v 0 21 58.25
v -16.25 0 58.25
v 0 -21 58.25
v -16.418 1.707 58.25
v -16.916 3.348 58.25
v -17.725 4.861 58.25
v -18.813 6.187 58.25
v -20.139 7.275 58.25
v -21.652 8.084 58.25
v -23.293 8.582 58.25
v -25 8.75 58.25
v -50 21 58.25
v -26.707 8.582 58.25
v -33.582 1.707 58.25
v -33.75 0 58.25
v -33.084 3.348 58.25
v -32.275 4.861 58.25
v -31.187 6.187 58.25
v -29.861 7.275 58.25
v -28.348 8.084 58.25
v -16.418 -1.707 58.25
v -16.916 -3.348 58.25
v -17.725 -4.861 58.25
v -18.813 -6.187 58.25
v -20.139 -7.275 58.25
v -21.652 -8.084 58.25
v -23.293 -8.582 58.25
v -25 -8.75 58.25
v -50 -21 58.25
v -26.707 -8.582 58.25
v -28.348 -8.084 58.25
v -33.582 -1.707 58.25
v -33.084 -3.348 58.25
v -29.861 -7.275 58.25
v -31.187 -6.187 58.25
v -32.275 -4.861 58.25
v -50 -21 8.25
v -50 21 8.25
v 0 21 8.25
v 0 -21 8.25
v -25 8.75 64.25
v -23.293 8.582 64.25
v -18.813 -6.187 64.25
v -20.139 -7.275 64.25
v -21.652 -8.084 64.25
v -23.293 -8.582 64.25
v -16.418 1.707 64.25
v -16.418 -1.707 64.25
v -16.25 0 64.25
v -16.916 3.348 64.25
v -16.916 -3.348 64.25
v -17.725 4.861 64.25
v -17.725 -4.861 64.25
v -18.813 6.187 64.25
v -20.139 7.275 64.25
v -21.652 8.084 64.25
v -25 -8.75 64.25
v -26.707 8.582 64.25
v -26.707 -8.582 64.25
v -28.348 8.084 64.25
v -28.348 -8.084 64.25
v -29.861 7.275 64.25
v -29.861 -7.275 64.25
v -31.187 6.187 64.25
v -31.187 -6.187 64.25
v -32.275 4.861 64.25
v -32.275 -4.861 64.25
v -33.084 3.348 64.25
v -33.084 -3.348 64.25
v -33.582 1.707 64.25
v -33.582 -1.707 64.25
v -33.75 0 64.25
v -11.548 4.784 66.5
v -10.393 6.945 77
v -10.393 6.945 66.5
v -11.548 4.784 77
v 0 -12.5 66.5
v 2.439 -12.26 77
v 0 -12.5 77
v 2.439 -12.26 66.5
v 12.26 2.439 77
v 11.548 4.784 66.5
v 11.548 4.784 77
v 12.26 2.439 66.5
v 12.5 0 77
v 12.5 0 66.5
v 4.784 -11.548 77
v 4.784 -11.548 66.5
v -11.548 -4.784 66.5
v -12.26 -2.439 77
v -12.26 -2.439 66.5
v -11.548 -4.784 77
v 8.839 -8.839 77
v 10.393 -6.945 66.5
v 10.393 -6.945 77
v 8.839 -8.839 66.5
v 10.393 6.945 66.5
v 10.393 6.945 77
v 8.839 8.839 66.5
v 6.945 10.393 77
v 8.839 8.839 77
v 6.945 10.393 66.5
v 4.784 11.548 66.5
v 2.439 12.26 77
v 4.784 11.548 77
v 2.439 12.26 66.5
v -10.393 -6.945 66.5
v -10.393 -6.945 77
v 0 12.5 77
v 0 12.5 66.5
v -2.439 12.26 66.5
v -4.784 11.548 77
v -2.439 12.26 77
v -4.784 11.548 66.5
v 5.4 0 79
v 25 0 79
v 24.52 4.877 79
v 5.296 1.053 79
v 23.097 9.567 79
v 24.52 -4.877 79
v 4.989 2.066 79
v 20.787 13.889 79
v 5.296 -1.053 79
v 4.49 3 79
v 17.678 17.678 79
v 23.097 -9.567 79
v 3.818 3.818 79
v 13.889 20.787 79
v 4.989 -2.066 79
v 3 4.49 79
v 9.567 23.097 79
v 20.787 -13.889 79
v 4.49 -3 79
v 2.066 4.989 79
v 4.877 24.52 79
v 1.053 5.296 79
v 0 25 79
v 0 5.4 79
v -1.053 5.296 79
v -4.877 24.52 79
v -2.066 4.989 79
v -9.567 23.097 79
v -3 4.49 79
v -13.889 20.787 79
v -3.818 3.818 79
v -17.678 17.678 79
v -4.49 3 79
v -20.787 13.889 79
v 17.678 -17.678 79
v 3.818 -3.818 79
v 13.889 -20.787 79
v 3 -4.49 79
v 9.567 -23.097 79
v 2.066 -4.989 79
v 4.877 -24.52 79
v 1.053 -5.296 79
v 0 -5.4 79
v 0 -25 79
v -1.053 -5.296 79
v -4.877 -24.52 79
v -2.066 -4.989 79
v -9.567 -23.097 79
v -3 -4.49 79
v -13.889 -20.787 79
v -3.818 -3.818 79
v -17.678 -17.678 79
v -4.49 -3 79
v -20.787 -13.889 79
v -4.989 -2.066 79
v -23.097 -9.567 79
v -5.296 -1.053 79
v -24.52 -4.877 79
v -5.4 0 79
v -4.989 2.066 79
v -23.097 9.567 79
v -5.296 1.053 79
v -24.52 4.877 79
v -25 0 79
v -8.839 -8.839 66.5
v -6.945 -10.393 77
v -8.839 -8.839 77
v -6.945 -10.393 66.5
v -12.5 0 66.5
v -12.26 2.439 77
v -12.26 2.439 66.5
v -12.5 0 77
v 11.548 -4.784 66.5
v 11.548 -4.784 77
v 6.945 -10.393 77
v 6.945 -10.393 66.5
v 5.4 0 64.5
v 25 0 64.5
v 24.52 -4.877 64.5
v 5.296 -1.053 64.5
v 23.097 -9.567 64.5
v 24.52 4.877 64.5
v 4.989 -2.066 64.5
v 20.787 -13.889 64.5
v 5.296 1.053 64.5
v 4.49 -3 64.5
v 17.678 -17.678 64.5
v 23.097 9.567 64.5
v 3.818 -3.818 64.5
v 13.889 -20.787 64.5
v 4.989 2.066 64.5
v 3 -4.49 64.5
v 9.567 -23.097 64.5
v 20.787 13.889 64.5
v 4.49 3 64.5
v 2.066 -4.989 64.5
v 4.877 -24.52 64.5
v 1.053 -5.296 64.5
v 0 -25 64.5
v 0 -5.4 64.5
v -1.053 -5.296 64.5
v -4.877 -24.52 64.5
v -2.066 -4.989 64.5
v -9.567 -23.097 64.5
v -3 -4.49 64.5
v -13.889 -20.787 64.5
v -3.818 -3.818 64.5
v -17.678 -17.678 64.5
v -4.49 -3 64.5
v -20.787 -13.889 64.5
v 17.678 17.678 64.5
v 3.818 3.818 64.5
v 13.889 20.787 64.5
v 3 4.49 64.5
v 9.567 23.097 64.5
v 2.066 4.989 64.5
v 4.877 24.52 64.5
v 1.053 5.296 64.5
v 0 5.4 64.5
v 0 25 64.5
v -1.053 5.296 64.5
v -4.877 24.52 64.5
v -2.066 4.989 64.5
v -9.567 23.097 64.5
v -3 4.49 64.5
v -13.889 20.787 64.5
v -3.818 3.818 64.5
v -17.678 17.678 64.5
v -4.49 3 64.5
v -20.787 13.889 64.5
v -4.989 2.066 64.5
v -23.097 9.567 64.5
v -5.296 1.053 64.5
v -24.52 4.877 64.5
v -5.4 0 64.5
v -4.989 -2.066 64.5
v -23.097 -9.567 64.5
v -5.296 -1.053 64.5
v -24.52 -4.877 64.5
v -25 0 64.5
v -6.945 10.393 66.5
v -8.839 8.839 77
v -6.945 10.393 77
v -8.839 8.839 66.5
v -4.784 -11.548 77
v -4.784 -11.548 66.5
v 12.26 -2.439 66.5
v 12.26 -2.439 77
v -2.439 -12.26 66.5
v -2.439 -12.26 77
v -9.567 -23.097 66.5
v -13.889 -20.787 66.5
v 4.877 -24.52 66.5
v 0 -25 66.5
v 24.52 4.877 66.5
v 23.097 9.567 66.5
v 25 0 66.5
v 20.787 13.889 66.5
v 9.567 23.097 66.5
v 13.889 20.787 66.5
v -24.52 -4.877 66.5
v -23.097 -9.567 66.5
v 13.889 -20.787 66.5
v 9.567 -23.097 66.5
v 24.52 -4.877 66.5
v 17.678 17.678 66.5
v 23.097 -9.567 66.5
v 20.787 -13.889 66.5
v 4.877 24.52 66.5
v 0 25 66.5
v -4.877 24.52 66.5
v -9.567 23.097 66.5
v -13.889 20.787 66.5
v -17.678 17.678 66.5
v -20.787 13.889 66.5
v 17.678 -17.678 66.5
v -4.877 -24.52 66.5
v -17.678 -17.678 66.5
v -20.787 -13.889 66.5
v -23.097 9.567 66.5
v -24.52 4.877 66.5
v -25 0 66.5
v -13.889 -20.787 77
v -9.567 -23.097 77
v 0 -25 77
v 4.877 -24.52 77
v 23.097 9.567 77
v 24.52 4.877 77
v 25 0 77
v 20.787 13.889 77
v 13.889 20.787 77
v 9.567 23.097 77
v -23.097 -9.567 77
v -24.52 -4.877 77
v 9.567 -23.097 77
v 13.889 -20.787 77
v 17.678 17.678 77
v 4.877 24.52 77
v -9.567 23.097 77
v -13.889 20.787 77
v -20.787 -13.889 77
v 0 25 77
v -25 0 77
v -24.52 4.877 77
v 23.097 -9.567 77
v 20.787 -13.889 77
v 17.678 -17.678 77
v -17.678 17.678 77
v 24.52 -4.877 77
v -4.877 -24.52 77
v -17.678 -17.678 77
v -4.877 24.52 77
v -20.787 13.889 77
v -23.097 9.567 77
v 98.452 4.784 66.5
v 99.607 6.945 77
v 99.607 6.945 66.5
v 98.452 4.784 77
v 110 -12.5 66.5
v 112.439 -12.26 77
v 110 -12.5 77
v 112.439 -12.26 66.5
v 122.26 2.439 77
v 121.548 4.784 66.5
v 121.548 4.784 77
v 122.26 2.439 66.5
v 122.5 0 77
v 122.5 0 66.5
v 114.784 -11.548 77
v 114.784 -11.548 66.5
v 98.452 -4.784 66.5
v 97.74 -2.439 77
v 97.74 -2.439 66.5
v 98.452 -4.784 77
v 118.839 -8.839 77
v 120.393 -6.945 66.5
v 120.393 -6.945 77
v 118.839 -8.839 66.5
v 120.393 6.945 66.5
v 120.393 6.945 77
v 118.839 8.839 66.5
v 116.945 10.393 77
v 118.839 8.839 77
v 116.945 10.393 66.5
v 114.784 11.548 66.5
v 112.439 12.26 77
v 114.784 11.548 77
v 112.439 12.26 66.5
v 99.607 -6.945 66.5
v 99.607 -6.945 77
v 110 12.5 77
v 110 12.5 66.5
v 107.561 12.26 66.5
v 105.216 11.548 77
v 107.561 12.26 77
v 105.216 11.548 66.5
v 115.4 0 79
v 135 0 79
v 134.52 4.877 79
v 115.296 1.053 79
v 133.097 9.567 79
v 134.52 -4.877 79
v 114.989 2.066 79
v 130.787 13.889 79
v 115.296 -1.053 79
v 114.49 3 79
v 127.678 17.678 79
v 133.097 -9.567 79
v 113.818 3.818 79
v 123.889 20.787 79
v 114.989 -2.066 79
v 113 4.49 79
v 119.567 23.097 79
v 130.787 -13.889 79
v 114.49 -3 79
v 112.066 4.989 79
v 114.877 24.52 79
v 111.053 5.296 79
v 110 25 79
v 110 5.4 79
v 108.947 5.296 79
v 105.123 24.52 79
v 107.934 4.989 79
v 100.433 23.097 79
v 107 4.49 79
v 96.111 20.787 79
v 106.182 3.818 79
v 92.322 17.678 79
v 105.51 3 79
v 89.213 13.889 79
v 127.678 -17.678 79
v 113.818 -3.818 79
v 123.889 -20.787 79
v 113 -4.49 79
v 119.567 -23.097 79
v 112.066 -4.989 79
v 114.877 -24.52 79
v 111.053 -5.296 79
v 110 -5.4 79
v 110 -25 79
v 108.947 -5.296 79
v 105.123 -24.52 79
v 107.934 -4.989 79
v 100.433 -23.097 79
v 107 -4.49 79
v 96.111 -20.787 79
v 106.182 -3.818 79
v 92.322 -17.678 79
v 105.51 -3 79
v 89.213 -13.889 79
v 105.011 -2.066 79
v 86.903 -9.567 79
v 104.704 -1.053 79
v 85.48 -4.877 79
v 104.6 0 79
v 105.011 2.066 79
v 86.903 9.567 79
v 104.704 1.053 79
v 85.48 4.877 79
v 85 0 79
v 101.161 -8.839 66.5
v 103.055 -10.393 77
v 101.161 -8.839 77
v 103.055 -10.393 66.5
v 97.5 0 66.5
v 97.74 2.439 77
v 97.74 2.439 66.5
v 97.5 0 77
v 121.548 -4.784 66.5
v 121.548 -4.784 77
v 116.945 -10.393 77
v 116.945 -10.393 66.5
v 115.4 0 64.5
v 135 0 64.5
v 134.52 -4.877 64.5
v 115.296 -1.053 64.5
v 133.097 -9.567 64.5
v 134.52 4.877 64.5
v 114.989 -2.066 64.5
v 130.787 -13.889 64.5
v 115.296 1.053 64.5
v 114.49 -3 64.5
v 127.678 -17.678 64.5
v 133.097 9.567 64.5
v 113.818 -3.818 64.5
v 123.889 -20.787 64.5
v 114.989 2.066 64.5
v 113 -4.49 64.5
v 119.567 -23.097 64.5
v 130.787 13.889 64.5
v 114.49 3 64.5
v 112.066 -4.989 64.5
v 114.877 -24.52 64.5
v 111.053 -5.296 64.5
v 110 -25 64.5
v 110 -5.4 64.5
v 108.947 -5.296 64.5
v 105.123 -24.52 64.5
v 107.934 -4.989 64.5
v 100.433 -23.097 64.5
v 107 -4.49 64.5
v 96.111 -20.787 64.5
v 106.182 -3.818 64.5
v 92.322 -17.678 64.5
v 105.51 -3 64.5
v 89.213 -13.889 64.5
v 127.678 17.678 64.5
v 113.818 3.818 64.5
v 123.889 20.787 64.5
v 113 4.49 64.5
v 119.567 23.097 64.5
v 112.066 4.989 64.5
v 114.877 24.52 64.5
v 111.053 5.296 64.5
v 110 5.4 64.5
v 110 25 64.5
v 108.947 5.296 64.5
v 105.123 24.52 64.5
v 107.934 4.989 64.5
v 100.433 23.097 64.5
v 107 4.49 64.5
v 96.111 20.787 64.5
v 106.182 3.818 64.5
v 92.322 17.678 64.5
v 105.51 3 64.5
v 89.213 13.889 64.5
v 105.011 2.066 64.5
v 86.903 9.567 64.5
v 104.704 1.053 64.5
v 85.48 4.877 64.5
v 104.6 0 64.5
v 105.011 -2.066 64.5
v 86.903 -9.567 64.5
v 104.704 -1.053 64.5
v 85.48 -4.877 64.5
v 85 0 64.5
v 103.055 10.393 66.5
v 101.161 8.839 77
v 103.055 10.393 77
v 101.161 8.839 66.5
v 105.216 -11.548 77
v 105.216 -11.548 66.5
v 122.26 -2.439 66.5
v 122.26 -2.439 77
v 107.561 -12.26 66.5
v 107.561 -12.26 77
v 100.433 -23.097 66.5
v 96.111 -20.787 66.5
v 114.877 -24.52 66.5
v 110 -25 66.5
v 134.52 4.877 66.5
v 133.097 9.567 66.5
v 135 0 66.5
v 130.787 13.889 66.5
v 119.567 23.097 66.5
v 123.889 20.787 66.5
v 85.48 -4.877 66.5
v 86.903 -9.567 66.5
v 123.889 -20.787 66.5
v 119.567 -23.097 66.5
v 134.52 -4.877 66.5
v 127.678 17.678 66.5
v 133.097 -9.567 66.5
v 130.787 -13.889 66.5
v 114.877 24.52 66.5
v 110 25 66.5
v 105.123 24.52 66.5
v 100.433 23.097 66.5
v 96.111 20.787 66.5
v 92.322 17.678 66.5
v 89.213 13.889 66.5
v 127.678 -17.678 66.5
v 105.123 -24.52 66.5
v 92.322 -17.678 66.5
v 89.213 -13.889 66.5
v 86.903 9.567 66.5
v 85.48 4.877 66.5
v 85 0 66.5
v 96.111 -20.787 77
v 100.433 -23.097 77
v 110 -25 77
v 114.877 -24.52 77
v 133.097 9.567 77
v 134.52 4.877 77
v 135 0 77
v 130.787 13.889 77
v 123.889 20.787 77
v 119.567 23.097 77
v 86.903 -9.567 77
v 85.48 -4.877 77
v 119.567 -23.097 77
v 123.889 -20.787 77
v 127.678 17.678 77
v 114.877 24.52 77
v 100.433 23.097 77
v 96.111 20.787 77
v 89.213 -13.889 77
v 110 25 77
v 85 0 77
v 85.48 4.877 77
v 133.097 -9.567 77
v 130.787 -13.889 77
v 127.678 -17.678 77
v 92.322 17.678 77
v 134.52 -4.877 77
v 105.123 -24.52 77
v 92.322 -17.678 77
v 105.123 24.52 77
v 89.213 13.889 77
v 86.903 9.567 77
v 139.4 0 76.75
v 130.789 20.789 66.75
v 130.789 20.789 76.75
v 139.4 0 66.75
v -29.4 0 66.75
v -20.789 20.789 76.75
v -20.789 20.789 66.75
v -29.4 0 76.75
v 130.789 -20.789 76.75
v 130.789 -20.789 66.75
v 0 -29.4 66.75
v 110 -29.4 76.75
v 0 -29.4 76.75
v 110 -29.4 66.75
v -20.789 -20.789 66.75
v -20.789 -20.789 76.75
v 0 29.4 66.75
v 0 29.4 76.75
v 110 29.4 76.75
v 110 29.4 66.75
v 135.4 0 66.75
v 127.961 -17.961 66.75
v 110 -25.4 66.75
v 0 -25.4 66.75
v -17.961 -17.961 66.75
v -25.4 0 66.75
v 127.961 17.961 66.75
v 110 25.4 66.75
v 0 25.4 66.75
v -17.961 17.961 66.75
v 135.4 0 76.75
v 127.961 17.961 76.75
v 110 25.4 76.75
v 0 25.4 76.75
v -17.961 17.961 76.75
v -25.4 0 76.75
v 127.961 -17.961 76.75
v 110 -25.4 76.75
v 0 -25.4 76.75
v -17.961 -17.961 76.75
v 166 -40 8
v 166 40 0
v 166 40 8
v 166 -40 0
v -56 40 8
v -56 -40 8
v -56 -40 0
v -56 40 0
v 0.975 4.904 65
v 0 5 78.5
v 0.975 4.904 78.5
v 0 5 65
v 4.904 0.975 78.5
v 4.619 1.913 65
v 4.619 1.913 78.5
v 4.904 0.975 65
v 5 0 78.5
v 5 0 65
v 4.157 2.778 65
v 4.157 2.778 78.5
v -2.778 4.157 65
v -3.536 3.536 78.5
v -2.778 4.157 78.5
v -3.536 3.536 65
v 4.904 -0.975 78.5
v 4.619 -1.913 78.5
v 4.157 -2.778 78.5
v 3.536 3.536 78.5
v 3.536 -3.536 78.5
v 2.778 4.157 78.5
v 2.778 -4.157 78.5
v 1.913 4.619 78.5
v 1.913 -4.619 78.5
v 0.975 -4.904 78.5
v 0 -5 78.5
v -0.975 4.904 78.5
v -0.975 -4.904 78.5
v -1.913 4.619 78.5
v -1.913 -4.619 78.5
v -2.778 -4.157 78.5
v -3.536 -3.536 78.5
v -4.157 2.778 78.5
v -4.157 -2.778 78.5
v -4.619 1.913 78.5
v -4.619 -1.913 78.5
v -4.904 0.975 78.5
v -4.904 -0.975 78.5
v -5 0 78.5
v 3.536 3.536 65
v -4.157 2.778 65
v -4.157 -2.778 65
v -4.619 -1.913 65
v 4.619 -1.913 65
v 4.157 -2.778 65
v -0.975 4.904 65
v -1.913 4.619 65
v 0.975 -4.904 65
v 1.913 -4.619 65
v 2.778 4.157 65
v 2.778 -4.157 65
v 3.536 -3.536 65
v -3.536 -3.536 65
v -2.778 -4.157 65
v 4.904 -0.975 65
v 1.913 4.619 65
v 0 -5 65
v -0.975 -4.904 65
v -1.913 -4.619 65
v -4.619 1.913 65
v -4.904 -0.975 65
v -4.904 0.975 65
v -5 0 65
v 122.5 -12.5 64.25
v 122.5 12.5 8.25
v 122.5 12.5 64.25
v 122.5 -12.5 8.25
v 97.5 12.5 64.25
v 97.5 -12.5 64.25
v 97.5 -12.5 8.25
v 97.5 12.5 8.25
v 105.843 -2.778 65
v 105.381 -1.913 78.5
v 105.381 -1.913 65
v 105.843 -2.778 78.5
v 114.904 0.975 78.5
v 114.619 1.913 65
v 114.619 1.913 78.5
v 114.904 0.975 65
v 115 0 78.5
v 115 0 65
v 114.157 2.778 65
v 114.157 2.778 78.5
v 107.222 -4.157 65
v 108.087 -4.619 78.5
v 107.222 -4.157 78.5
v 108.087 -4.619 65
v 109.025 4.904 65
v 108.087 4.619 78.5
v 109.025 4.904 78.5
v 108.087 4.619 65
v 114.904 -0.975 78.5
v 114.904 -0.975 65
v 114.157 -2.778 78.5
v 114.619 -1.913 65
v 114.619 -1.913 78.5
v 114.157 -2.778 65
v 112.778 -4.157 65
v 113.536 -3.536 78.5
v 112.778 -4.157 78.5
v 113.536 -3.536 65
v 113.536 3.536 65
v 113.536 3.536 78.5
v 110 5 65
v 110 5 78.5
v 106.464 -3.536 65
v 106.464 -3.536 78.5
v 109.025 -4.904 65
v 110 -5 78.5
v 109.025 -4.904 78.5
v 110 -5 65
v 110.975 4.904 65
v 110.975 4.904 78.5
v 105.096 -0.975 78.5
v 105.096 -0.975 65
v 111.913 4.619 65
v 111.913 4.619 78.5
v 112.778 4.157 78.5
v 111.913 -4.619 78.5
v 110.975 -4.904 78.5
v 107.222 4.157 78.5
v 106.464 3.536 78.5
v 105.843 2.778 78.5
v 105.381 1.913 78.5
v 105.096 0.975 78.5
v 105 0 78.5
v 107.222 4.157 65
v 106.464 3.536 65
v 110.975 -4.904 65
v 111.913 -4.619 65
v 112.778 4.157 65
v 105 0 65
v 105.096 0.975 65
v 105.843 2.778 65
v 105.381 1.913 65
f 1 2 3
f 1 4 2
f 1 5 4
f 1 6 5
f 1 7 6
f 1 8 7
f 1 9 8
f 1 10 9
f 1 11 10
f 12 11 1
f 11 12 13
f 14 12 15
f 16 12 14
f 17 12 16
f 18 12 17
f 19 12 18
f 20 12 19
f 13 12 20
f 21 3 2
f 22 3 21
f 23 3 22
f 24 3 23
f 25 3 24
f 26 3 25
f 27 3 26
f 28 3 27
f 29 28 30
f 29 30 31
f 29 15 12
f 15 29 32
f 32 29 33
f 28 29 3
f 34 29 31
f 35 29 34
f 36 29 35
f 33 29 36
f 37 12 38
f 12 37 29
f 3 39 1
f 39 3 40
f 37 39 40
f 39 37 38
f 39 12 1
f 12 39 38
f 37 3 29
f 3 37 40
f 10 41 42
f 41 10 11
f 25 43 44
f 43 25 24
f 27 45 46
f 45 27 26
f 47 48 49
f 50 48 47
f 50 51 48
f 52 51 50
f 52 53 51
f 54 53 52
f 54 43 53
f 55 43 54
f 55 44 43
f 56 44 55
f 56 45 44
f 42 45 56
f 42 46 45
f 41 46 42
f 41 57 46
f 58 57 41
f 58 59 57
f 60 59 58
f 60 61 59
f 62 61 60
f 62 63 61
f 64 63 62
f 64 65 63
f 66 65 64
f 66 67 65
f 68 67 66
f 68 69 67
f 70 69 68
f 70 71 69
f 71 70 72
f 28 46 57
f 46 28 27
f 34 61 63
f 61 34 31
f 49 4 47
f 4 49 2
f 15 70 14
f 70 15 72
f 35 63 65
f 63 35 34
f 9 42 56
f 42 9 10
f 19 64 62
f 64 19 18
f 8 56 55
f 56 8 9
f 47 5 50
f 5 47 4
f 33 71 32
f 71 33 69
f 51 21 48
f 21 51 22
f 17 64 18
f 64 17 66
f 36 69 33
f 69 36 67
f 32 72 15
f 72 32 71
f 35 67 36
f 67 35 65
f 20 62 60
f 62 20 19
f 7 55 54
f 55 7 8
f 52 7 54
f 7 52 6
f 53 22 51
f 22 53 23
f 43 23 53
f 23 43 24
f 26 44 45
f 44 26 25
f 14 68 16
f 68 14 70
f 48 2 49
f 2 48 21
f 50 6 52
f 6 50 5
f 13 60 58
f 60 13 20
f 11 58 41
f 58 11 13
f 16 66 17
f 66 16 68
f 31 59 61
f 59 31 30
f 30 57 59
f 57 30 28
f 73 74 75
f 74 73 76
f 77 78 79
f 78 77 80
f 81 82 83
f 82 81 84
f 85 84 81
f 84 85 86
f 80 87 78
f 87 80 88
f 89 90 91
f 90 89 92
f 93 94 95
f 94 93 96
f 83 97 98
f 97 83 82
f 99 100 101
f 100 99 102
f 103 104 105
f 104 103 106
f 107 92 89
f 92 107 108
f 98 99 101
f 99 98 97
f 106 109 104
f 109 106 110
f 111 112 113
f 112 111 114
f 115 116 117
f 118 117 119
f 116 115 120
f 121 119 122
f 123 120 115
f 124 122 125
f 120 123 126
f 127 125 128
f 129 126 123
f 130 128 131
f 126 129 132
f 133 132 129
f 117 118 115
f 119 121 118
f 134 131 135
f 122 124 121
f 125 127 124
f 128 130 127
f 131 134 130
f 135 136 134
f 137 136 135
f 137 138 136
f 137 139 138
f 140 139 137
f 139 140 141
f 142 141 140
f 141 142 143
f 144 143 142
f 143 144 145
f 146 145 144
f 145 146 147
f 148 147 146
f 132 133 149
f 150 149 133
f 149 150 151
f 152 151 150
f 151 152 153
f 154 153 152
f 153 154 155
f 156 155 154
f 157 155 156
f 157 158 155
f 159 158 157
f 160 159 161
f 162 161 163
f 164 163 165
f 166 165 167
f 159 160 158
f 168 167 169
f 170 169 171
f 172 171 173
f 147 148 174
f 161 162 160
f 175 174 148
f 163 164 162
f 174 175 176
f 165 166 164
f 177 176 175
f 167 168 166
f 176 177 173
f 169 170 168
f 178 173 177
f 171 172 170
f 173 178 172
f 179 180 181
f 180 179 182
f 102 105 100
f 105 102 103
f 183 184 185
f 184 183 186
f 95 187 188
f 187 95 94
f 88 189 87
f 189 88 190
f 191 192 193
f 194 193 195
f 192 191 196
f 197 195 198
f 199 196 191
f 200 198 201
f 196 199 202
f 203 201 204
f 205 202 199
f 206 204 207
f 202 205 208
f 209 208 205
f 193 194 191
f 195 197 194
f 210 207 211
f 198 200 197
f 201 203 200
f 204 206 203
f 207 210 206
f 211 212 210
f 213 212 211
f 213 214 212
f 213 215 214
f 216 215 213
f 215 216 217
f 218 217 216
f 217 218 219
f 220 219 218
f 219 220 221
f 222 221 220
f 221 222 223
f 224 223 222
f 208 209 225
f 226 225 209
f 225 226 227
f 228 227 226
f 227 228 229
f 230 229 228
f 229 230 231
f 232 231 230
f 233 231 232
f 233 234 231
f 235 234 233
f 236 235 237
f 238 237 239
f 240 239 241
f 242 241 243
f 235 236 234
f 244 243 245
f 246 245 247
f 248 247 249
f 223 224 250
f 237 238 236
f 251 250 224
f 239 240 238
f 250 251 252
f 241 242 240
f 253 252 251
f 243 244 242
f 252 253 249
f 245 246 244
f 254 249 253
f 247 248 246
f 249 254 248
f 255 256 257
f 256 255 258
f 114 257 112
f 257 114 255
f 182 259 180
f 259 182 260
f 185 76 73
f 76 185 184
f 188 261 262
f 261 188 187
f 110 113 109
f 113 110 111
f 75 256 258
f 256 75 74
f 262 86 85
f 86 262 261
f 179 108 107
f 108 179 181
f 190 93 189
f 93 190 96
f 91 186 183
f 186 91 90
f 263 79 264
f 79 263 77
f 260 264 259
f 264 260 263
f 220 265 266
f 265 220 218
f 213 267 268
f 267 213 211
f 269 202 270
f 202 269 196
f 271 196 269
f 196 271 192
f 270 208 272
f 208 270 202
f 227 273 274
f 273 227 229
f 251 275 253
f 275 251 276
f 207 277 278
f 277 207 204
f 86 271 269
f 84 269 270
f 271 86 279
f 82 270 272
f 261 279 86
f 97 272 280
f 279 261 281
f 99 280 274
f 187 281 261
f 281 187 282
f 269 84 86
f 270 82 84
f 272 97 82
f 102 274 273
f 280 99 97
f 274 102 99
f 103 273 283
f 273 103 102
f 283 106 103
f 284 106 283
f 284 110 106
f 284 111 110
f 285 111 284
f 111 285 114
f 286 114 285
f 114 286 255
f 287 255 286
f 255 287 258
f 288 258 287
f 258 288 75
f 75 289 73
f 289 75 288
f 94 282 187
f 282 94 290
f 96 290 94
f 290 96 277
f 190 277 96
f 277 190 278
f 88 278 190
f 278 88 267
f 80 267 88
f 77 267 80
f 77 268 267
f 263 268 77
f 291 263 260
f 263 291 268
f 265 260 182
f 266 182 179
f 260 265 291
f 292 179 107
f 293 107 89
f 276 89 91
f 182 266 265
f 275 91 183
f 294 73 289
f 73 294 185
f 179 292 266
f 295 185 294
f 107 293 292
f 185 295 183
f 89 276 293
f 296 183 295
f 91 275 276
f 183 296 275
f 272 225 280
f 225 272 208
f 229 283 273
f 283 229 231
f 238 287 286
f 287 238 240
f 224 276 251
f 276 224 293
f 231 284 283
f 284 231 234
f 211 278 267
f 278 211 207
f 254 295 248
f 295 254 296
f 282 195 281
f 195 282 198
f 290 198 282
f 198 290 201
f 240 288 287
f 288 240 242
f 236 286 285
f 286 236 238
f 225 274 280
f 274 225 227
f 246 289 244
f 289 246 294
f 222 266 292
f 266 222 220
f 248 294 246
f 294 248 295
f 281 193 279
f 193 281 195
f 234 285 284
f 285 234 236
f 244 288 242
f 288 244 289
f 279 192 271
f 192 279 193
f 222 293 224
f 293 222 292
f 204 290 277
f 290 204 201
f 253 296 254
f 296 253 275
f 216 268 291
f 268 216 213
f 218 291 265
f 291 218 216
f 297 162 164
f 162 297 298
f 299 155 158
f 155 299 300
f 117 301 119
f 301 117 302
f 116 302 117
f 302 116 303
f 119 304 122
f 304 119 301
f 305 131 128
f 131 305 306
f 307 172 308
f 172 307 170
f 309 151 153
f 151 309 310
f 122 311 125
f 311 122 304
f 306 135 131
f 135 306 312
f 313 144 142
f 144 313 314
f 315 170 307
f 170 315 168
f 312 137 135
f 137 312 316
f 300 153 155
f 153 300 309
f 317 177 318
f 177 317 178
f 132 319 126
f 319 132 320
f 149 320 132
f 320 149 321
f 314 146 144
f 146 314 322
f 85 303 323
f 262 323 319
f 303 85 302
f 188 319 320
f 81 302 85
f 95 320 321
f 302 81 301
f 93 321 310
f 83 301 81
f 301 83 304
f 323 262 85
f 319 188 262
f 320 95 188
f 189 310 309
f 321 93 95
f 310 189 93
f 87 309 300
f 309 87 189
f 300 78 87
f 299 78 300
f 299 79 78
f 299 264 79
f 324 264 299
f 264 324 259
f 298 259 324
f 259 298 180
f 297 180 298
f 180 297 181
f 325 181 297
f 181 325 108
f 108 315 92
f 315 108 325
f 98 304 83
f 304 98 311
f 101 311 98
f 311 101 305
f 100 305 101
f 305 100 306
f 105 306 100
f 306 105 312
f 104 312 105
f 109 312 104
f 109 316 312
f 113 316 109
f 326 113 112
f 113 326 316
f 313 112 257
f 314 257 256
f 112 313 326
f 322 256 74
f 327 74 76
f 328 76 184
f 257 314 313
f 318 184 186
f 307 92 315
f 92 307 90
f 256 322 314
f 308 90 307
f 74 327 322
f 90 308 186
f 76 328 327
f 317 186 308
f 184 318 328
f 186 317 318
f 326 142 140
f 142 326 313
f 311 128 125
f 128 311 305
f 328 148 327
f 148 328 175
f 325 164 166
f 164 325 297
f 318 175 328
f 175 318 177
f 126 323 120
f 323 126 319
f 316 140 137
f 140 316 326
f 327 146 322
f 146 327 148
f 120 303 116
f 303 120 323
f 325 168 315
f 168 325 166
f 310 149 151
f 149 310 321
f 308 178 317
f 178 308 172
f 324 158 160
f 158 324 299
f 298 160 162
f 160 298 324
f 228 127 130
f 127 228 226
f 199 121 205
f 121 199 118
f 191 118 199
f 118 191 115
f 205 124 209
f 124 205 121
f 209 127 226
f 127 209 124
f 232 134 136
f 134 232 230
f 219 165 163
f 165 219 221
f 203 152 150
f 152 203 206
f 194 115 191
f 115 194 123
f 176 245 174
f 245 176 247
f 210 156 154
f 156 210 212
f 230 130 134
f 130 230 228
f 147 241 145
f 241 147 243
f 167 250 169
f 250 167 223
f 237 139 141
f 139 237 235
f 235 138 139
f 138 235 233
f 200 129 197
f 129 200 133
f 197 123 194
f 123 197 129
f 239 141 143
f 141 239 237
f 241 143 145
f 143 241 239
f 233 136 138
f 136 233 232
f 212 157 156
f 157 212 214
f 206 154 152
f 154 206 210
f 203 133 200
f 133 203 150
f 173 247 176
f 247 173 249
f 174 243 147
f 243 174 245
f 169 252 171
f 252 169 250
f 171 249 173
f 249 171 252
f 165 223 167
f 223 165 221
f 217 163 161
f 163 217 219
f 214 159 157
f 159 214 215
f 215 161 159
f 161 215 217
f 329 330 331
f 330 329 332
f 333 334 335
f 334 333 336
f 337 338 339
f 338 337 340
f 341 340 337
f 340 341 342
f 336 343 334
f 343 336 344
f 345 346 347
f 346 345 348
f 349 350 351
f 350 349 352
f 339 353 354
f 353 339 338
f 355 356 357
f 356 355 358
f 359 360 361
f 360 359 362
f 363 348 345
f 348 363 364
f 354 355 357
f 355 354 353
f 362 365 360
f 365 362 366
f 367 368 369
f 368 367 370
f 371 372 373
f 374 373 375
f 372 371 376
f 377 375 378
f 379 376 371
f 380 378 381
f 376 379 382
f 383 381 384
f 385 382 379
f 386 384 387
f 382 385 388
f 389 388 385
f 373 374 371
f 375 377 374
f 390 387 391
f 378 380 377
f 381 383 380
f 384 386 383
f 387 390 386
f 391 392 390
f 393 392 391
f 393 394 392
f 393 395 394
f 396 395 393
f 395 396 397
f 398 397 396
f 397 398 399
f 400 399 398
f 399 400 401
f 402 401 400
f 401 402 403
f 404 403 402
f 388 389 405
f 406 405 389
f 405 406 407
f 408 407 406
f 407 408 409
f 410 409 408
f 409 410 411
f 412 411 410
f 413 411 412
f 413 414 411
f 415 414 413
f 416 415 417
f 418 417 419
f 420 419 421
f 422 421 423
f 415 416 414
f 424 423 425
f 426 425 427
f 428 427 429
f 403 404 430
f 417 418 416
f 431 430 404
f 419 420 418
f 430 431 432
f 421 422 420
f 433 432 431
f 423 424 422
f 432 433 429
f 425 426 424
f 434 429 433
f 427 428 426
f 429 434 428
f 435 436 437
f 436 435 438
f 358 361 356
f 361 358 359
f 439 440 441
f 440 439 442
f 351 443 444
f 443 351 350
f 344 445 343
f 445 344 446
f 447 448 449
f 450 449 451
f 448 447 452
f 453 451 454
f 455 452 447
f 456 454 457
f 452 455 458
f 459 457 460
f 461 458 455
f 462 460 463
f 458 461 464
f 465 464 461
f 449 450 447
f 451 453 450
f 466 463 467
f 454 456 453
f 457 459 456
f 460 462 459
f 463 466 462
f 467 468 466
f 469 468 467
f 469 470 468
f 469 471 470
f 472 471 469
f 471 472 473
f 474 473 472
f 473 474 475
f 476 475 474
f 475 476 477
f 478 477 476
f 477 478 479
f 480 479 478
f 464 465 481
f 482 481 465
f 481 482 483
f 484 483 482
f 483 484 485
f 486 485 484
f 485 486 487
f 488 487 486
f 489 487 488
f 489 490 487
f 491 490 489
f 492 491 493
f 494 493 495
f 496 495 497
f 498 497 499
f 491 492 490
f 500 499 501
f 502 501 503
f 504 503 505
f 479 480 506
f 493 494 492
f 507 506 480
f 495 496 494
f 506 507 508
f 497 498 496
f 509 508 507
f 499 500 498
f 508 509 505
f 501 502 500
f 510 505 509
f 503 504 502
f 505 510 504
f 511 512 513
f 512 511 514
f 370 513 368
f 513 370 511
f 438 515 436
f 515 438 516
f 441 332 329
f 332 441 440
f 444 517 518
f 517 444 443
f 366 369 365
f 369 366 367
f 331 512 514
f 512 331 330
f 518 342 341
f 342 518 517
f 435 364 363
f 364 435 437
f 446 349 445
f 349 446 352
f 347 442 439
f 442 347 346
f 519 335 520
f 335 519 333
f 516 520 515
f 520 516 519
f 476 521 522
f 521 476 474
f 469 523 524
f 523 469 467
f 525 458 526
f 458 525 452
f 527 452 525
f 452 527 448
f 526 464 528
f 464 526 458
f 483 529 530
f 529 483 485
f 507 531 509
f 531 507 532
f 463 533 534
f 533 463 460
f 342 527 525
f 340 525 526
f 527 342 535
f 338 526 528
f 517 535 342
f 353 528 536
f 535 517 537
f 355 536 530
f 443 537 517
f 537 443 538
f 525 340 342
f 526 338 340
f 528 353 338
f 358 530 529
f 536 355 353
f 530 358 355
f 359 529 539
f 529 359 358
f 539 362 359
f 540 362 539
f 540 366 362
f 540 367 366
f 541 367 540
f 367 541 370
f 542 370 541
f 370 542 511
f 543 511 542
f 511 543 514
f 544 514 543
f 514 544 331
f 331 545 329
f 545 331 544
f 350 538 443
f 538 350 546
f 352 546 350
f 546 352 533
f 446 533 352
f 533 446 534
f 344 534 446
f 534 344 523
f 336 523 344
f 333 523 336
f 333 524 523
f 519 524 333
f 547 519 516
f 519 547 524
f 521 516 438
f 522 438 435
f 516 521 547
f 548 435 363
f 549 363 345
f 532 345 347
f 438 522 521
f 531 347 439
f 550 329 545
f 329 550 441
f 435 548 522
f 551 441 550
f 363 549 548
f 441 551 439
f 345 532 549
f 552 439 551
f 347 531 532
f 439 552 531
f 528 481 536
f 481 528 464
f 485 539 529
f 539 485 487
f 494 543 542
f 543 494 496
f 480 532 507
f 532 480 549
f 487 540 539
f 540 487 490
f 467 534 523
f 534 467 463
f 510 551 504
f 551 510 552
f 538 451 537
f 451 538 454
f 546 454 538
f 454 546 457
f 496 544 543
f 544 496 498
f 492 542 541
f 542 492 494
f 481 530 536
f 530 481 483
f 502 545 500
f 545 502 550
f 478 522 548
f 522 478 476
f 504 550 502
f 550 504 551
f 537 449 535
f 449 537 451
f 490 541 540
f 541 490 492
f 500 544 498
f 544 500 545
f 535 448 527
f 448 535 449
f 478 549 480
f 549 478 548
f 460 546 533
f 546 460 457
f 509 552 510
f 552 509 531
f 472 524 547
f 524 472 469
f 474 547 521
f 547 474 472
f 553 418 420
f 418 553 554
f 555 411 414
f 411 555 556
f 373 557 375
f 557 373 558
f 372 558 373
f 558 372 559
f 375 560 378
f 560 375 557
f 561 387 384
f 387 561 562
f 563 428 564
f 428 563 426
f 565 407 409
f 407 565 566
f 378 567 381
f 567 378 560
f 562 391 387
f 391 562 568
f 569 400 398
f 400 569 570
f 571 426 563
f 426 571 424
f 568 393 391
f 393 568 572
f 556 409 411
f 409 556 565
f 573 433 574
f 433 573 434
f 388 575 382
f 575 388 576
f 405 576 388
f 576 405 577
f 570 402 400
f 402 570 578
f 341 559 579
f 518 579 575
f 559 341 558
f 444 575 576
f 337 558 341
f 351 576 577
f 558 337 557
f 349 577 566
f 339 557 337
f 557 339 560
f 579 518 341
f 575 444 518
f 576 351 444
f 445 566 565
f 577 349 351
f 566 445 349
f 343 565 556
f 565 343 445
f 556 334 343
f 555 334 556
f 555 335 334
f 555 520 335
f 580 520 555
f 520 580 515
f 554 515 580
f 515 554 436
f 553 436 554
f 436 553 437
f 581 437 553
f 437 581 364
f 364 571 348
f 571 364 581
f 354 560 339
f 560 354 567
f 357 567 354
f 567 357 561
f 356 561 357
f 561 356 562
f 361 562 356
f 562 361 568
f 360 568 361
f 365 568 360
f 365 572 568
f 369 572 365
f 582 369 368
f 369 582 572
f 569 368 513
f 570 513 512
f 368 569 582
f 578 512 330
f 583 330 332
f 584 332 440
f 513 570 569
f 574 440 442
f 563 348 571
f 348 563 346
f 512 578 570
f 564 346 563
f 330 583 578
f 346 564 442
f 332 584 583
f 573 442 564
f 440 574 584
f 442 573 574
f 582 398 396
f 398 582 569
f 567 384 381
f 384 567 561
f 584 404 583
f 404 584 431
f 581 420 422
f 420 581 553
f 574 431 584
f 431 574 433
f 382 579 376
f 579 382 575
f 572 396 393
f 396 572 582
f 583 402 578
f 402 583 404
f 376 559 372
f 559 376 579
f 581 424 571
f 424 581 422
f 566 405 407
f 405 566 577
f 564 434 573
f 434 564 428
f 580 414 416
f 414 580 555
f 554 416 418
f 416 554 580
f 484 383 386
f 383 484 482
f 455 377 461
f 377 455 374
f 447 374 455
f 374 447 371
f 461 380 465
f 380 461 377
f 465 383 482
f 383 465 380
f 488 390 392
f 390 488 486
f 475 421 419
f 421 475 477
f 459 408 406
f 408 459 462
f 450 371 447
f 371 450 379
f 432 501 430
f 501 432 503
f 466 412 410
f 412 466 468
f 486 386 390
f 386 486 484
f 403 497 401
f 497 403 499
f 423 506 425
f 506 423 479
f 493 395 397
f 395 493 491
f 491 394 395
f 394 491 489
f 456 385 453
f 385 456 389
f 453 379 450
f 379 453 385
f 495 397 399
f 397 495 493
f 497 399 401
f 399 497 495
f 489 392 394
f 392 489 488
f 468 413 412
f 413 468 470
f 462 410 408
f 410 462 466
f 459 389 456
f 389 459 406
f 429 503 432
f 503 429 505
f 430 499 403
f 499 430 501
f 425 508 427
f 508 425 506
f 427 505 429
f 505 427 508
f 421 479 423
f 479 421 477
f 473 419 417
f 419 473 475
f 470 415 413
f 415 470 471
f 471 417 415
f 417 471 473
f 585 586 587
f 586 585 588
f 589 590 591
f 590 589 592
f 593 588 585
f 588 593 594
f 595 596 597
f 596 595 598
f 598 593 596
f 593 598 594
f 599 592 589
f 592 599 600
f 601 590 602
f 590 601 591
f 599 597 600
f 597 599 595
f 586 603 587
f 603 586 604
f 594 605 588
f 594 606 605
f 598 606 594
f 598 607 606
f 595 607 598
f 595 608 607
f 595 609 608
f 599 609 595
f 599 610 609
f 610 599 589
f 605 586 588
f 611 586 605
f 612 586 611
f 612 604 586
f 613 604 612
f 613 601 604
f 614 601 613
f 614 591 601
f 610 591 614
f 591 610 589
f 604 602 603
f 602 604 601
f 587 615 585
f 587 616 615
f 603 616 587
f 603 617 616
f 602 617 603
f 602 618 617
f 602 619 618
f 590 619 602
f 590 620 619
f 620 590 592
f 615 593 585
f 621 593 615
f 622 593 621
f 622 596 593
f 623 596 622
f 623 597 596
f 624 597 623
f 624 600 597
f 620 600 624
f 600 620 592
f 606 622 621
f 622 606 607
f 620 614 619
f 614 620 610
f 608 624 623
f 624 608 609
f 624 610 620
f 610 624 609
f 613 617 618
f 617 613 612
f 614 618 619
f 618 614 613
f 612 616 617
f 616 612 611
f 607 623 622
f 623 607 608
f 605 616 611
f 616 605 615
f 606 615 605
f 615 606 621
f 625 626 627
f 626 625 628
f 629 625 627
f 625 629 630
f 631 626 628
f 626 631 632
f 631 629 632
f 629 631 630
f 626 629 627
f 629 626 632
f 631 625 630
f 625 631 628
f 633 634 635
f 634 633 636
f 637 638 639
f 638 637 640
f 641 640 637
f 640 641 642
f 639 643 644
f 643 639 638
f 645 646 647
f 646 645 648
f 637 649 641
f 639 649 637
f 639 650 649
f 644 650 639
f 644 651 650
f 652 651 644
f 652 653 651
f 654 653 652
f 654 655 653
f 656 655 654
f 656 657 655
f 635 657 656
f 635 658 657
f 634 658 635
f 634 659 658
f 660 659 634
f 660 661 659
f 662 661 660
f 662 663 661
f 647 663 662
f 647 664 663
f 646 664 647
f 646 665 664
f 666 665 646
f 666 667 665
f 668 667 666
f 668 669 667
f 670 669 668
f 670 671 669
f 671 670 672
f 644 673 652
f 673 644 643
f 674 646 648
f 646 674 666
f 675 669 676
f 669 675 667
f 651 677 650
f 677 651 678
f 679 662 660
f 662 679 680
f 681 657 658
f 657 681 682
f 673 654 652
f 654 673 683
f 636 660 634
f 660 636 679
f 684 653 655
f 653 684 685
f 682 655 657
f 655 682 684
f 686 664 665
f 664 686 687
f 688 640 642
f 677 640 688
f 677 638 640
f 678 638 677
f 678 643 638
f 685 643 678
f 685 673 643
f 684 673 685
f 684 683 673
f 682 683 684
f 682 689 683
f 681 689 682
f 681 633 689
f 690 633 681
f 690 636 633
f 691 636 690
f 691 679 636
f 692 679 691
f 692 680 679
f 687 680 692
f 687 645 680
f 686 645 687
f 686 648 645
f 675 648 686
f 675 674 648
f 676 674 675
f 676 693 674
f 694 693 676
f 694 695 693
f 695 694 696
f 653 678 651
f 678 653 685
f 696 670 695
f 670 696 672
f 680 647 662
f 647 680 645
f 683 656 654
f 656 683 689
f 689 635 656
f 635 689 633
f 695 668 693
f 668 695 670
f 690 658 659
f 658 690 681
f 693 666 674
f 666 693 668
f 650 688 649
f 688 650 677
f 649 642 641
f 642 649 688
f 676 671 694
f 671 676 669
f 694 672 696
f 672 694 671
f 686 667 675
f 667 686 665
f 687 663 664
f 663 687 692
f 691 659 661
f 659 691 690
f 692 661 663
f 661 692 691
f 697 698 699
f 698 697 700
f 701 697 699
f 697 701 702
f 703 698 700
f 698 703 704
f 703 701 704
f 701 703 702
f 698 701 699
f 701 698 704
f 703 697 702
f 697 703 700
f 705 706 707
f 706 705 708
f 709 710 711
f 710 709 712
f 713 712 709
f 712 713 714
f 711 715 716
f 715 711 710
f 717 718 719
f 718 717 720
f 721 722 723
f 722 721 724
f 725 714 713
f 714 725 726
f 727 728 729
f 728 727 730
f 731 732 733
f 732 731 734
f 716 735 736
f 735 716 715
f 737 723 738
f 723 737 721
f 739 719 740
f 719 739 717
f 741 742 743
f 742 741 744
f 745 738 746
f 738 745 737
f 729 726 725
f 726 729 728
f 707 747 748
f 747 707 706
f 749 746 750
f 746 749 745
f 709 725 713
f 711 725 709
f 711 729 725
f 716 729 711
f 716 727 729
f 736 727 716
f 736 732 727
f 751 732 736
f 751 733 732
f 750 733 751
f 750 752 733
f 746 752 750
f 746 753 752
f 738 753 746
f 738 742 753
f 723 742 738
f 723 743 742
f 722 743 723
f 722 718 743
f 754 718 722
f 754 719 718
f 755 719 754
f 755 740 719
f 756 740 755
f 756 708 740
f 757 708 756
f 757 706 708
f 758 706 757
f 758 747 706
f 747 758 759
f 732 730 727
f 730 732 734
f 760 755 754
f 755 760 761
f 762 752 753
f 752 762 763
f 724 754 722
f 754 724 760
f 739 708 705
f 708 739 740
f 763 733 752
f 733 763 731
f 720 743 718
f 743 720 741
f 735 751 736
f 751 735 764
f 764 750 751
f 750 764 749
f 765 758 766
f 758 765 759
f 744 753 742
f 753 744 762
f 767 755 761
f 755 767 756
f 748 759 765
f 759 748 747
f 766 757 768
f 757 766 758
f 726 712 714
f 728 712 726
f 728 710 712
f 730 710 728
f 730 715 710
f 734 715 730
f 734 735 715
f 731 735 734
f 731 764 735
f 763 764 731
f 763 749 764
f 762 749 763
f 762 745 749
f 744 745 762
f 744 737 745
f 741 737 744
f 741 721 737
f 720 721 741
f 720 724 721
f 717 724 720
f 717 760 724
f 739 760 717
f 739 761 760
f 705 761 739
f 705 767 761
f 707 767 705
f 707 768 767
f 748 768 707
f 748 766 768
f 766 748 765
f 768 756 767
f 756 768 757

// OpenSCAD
$fn = 32;

// ------------------------------------------------------------------------
// Motor belt drive: span 110 mm, pulleys d50, belt 10 mm wide
// Every part is its own module, assembly() places every instance.
// ------------------------------------------------------------------------

// --- part 1 ---
module base_plate() {
  difference() {
    translate([-111, -40, 0]) cube([222, 80, 8]);
  }
}

// --- part 2 ---
module motor() {
  union() {
    translate([-25, -21, 0]) cube([50, 42, 50]);
    translate([28, 0, 25]) rotate([0, 90, 0]) cylinder(h = 6, d = 17.5, center = true);
  }
}

// --- part 3 ---
module drive_shaft() {
  translate([0, 0, -6.75]) cylinder(h = 13.5, d = 10);
}

// --- part 4 ---
module pulley_drive() {
  difference() {
    union() {
      cylinder(h = 14.5, d = 25);
      cylinder(h = 2, d = 50);
      translate([0, 0, 12.5]) cylinder(h = 2, d = 50);
    }
    translate([0, 0, -1]) cylinder(h = 16.5, d = 10.8);
  }
}

// --- part 5 ---
module idler_post() {
  translate([-12.5, -12.5, 0]) cube([25, 25, 56]);
}

// --- part 6 ---
module driven_shaft() {
  translate([0, 0, -6.75]) cylinder(h = 13.5, d = 10);
}

// --- part 7 ---
module pulley_driven() {
  difference() {
    union() {
      cylinder(h = 14.5, d = 25);
      cylinder(h = 2, d = 50);
      translate([0, 0, 12.5]) cylinder(h = 2, d = 50);
    }
    translate([0, 0, -1]) cylinder(h = 16.5, d = 10.8);
  }
}

// --- part 8 ---
module drive_belt() {
  difference() {
    linear_extrude(height = 10) polygon(points = concat([for (a = [90 : 45 : 270]) [29.4 * cos(a), 29.4 * sin(a)]], [for (a = [270 : 45 : 450]) [110 + 29.4 * cos(a), 29.4 * sin(a)]]));
    translate([0, 0, -1]) linear_extrude(height = 12) polygon(points = concat([for (a = [90 : 45 : 270]) [25.4 * cos(a), 25.4 * sin(a)]], [for (a = [270 : 45 : 450]) [110 + 25.4 * cos(a), 25.4 * sin(a)]]));
  }
}

// --- assembly ---
module assembly() {
  color([0.80, 0.24, 0.20]) translate([55, 0, 0]) rotate([0, 0, 0]) base_plate();
  color([0.20, 0.45, 0.75]) translate([0, 0, 33.25]) rotate([0, 270, 0]) motor();
  color([0.25, 0.62, 0.32]) translate([0, 0, 71.75]) rotate([0, 0, 0]) drive_shaft();
  color([0.92, 0.70, 0.18]) translate([0, 0, 64.5]) rotate([0, 0, 0]) pulley_drive();
  color([0.58, 0.35, 0.70]) translate([110, 0, 8.25]) rotate([0, 0, 0]) idler_post();
  color([0.16, 0.66, 0.66]) translate([110, 0, 71.75]) rotate([0, 0, 0]) driven_shaft();
  color([0.85, 0.48, 0.18]) translate([110, 0, 64.5]) rotate([0, 0, 0]) pulley_driven();
  color([0.55, 0.60, 0.65]) translate([0, 0, 66.75]) rotate([0, 0, 0]) drive_belt();
}

assembly();
